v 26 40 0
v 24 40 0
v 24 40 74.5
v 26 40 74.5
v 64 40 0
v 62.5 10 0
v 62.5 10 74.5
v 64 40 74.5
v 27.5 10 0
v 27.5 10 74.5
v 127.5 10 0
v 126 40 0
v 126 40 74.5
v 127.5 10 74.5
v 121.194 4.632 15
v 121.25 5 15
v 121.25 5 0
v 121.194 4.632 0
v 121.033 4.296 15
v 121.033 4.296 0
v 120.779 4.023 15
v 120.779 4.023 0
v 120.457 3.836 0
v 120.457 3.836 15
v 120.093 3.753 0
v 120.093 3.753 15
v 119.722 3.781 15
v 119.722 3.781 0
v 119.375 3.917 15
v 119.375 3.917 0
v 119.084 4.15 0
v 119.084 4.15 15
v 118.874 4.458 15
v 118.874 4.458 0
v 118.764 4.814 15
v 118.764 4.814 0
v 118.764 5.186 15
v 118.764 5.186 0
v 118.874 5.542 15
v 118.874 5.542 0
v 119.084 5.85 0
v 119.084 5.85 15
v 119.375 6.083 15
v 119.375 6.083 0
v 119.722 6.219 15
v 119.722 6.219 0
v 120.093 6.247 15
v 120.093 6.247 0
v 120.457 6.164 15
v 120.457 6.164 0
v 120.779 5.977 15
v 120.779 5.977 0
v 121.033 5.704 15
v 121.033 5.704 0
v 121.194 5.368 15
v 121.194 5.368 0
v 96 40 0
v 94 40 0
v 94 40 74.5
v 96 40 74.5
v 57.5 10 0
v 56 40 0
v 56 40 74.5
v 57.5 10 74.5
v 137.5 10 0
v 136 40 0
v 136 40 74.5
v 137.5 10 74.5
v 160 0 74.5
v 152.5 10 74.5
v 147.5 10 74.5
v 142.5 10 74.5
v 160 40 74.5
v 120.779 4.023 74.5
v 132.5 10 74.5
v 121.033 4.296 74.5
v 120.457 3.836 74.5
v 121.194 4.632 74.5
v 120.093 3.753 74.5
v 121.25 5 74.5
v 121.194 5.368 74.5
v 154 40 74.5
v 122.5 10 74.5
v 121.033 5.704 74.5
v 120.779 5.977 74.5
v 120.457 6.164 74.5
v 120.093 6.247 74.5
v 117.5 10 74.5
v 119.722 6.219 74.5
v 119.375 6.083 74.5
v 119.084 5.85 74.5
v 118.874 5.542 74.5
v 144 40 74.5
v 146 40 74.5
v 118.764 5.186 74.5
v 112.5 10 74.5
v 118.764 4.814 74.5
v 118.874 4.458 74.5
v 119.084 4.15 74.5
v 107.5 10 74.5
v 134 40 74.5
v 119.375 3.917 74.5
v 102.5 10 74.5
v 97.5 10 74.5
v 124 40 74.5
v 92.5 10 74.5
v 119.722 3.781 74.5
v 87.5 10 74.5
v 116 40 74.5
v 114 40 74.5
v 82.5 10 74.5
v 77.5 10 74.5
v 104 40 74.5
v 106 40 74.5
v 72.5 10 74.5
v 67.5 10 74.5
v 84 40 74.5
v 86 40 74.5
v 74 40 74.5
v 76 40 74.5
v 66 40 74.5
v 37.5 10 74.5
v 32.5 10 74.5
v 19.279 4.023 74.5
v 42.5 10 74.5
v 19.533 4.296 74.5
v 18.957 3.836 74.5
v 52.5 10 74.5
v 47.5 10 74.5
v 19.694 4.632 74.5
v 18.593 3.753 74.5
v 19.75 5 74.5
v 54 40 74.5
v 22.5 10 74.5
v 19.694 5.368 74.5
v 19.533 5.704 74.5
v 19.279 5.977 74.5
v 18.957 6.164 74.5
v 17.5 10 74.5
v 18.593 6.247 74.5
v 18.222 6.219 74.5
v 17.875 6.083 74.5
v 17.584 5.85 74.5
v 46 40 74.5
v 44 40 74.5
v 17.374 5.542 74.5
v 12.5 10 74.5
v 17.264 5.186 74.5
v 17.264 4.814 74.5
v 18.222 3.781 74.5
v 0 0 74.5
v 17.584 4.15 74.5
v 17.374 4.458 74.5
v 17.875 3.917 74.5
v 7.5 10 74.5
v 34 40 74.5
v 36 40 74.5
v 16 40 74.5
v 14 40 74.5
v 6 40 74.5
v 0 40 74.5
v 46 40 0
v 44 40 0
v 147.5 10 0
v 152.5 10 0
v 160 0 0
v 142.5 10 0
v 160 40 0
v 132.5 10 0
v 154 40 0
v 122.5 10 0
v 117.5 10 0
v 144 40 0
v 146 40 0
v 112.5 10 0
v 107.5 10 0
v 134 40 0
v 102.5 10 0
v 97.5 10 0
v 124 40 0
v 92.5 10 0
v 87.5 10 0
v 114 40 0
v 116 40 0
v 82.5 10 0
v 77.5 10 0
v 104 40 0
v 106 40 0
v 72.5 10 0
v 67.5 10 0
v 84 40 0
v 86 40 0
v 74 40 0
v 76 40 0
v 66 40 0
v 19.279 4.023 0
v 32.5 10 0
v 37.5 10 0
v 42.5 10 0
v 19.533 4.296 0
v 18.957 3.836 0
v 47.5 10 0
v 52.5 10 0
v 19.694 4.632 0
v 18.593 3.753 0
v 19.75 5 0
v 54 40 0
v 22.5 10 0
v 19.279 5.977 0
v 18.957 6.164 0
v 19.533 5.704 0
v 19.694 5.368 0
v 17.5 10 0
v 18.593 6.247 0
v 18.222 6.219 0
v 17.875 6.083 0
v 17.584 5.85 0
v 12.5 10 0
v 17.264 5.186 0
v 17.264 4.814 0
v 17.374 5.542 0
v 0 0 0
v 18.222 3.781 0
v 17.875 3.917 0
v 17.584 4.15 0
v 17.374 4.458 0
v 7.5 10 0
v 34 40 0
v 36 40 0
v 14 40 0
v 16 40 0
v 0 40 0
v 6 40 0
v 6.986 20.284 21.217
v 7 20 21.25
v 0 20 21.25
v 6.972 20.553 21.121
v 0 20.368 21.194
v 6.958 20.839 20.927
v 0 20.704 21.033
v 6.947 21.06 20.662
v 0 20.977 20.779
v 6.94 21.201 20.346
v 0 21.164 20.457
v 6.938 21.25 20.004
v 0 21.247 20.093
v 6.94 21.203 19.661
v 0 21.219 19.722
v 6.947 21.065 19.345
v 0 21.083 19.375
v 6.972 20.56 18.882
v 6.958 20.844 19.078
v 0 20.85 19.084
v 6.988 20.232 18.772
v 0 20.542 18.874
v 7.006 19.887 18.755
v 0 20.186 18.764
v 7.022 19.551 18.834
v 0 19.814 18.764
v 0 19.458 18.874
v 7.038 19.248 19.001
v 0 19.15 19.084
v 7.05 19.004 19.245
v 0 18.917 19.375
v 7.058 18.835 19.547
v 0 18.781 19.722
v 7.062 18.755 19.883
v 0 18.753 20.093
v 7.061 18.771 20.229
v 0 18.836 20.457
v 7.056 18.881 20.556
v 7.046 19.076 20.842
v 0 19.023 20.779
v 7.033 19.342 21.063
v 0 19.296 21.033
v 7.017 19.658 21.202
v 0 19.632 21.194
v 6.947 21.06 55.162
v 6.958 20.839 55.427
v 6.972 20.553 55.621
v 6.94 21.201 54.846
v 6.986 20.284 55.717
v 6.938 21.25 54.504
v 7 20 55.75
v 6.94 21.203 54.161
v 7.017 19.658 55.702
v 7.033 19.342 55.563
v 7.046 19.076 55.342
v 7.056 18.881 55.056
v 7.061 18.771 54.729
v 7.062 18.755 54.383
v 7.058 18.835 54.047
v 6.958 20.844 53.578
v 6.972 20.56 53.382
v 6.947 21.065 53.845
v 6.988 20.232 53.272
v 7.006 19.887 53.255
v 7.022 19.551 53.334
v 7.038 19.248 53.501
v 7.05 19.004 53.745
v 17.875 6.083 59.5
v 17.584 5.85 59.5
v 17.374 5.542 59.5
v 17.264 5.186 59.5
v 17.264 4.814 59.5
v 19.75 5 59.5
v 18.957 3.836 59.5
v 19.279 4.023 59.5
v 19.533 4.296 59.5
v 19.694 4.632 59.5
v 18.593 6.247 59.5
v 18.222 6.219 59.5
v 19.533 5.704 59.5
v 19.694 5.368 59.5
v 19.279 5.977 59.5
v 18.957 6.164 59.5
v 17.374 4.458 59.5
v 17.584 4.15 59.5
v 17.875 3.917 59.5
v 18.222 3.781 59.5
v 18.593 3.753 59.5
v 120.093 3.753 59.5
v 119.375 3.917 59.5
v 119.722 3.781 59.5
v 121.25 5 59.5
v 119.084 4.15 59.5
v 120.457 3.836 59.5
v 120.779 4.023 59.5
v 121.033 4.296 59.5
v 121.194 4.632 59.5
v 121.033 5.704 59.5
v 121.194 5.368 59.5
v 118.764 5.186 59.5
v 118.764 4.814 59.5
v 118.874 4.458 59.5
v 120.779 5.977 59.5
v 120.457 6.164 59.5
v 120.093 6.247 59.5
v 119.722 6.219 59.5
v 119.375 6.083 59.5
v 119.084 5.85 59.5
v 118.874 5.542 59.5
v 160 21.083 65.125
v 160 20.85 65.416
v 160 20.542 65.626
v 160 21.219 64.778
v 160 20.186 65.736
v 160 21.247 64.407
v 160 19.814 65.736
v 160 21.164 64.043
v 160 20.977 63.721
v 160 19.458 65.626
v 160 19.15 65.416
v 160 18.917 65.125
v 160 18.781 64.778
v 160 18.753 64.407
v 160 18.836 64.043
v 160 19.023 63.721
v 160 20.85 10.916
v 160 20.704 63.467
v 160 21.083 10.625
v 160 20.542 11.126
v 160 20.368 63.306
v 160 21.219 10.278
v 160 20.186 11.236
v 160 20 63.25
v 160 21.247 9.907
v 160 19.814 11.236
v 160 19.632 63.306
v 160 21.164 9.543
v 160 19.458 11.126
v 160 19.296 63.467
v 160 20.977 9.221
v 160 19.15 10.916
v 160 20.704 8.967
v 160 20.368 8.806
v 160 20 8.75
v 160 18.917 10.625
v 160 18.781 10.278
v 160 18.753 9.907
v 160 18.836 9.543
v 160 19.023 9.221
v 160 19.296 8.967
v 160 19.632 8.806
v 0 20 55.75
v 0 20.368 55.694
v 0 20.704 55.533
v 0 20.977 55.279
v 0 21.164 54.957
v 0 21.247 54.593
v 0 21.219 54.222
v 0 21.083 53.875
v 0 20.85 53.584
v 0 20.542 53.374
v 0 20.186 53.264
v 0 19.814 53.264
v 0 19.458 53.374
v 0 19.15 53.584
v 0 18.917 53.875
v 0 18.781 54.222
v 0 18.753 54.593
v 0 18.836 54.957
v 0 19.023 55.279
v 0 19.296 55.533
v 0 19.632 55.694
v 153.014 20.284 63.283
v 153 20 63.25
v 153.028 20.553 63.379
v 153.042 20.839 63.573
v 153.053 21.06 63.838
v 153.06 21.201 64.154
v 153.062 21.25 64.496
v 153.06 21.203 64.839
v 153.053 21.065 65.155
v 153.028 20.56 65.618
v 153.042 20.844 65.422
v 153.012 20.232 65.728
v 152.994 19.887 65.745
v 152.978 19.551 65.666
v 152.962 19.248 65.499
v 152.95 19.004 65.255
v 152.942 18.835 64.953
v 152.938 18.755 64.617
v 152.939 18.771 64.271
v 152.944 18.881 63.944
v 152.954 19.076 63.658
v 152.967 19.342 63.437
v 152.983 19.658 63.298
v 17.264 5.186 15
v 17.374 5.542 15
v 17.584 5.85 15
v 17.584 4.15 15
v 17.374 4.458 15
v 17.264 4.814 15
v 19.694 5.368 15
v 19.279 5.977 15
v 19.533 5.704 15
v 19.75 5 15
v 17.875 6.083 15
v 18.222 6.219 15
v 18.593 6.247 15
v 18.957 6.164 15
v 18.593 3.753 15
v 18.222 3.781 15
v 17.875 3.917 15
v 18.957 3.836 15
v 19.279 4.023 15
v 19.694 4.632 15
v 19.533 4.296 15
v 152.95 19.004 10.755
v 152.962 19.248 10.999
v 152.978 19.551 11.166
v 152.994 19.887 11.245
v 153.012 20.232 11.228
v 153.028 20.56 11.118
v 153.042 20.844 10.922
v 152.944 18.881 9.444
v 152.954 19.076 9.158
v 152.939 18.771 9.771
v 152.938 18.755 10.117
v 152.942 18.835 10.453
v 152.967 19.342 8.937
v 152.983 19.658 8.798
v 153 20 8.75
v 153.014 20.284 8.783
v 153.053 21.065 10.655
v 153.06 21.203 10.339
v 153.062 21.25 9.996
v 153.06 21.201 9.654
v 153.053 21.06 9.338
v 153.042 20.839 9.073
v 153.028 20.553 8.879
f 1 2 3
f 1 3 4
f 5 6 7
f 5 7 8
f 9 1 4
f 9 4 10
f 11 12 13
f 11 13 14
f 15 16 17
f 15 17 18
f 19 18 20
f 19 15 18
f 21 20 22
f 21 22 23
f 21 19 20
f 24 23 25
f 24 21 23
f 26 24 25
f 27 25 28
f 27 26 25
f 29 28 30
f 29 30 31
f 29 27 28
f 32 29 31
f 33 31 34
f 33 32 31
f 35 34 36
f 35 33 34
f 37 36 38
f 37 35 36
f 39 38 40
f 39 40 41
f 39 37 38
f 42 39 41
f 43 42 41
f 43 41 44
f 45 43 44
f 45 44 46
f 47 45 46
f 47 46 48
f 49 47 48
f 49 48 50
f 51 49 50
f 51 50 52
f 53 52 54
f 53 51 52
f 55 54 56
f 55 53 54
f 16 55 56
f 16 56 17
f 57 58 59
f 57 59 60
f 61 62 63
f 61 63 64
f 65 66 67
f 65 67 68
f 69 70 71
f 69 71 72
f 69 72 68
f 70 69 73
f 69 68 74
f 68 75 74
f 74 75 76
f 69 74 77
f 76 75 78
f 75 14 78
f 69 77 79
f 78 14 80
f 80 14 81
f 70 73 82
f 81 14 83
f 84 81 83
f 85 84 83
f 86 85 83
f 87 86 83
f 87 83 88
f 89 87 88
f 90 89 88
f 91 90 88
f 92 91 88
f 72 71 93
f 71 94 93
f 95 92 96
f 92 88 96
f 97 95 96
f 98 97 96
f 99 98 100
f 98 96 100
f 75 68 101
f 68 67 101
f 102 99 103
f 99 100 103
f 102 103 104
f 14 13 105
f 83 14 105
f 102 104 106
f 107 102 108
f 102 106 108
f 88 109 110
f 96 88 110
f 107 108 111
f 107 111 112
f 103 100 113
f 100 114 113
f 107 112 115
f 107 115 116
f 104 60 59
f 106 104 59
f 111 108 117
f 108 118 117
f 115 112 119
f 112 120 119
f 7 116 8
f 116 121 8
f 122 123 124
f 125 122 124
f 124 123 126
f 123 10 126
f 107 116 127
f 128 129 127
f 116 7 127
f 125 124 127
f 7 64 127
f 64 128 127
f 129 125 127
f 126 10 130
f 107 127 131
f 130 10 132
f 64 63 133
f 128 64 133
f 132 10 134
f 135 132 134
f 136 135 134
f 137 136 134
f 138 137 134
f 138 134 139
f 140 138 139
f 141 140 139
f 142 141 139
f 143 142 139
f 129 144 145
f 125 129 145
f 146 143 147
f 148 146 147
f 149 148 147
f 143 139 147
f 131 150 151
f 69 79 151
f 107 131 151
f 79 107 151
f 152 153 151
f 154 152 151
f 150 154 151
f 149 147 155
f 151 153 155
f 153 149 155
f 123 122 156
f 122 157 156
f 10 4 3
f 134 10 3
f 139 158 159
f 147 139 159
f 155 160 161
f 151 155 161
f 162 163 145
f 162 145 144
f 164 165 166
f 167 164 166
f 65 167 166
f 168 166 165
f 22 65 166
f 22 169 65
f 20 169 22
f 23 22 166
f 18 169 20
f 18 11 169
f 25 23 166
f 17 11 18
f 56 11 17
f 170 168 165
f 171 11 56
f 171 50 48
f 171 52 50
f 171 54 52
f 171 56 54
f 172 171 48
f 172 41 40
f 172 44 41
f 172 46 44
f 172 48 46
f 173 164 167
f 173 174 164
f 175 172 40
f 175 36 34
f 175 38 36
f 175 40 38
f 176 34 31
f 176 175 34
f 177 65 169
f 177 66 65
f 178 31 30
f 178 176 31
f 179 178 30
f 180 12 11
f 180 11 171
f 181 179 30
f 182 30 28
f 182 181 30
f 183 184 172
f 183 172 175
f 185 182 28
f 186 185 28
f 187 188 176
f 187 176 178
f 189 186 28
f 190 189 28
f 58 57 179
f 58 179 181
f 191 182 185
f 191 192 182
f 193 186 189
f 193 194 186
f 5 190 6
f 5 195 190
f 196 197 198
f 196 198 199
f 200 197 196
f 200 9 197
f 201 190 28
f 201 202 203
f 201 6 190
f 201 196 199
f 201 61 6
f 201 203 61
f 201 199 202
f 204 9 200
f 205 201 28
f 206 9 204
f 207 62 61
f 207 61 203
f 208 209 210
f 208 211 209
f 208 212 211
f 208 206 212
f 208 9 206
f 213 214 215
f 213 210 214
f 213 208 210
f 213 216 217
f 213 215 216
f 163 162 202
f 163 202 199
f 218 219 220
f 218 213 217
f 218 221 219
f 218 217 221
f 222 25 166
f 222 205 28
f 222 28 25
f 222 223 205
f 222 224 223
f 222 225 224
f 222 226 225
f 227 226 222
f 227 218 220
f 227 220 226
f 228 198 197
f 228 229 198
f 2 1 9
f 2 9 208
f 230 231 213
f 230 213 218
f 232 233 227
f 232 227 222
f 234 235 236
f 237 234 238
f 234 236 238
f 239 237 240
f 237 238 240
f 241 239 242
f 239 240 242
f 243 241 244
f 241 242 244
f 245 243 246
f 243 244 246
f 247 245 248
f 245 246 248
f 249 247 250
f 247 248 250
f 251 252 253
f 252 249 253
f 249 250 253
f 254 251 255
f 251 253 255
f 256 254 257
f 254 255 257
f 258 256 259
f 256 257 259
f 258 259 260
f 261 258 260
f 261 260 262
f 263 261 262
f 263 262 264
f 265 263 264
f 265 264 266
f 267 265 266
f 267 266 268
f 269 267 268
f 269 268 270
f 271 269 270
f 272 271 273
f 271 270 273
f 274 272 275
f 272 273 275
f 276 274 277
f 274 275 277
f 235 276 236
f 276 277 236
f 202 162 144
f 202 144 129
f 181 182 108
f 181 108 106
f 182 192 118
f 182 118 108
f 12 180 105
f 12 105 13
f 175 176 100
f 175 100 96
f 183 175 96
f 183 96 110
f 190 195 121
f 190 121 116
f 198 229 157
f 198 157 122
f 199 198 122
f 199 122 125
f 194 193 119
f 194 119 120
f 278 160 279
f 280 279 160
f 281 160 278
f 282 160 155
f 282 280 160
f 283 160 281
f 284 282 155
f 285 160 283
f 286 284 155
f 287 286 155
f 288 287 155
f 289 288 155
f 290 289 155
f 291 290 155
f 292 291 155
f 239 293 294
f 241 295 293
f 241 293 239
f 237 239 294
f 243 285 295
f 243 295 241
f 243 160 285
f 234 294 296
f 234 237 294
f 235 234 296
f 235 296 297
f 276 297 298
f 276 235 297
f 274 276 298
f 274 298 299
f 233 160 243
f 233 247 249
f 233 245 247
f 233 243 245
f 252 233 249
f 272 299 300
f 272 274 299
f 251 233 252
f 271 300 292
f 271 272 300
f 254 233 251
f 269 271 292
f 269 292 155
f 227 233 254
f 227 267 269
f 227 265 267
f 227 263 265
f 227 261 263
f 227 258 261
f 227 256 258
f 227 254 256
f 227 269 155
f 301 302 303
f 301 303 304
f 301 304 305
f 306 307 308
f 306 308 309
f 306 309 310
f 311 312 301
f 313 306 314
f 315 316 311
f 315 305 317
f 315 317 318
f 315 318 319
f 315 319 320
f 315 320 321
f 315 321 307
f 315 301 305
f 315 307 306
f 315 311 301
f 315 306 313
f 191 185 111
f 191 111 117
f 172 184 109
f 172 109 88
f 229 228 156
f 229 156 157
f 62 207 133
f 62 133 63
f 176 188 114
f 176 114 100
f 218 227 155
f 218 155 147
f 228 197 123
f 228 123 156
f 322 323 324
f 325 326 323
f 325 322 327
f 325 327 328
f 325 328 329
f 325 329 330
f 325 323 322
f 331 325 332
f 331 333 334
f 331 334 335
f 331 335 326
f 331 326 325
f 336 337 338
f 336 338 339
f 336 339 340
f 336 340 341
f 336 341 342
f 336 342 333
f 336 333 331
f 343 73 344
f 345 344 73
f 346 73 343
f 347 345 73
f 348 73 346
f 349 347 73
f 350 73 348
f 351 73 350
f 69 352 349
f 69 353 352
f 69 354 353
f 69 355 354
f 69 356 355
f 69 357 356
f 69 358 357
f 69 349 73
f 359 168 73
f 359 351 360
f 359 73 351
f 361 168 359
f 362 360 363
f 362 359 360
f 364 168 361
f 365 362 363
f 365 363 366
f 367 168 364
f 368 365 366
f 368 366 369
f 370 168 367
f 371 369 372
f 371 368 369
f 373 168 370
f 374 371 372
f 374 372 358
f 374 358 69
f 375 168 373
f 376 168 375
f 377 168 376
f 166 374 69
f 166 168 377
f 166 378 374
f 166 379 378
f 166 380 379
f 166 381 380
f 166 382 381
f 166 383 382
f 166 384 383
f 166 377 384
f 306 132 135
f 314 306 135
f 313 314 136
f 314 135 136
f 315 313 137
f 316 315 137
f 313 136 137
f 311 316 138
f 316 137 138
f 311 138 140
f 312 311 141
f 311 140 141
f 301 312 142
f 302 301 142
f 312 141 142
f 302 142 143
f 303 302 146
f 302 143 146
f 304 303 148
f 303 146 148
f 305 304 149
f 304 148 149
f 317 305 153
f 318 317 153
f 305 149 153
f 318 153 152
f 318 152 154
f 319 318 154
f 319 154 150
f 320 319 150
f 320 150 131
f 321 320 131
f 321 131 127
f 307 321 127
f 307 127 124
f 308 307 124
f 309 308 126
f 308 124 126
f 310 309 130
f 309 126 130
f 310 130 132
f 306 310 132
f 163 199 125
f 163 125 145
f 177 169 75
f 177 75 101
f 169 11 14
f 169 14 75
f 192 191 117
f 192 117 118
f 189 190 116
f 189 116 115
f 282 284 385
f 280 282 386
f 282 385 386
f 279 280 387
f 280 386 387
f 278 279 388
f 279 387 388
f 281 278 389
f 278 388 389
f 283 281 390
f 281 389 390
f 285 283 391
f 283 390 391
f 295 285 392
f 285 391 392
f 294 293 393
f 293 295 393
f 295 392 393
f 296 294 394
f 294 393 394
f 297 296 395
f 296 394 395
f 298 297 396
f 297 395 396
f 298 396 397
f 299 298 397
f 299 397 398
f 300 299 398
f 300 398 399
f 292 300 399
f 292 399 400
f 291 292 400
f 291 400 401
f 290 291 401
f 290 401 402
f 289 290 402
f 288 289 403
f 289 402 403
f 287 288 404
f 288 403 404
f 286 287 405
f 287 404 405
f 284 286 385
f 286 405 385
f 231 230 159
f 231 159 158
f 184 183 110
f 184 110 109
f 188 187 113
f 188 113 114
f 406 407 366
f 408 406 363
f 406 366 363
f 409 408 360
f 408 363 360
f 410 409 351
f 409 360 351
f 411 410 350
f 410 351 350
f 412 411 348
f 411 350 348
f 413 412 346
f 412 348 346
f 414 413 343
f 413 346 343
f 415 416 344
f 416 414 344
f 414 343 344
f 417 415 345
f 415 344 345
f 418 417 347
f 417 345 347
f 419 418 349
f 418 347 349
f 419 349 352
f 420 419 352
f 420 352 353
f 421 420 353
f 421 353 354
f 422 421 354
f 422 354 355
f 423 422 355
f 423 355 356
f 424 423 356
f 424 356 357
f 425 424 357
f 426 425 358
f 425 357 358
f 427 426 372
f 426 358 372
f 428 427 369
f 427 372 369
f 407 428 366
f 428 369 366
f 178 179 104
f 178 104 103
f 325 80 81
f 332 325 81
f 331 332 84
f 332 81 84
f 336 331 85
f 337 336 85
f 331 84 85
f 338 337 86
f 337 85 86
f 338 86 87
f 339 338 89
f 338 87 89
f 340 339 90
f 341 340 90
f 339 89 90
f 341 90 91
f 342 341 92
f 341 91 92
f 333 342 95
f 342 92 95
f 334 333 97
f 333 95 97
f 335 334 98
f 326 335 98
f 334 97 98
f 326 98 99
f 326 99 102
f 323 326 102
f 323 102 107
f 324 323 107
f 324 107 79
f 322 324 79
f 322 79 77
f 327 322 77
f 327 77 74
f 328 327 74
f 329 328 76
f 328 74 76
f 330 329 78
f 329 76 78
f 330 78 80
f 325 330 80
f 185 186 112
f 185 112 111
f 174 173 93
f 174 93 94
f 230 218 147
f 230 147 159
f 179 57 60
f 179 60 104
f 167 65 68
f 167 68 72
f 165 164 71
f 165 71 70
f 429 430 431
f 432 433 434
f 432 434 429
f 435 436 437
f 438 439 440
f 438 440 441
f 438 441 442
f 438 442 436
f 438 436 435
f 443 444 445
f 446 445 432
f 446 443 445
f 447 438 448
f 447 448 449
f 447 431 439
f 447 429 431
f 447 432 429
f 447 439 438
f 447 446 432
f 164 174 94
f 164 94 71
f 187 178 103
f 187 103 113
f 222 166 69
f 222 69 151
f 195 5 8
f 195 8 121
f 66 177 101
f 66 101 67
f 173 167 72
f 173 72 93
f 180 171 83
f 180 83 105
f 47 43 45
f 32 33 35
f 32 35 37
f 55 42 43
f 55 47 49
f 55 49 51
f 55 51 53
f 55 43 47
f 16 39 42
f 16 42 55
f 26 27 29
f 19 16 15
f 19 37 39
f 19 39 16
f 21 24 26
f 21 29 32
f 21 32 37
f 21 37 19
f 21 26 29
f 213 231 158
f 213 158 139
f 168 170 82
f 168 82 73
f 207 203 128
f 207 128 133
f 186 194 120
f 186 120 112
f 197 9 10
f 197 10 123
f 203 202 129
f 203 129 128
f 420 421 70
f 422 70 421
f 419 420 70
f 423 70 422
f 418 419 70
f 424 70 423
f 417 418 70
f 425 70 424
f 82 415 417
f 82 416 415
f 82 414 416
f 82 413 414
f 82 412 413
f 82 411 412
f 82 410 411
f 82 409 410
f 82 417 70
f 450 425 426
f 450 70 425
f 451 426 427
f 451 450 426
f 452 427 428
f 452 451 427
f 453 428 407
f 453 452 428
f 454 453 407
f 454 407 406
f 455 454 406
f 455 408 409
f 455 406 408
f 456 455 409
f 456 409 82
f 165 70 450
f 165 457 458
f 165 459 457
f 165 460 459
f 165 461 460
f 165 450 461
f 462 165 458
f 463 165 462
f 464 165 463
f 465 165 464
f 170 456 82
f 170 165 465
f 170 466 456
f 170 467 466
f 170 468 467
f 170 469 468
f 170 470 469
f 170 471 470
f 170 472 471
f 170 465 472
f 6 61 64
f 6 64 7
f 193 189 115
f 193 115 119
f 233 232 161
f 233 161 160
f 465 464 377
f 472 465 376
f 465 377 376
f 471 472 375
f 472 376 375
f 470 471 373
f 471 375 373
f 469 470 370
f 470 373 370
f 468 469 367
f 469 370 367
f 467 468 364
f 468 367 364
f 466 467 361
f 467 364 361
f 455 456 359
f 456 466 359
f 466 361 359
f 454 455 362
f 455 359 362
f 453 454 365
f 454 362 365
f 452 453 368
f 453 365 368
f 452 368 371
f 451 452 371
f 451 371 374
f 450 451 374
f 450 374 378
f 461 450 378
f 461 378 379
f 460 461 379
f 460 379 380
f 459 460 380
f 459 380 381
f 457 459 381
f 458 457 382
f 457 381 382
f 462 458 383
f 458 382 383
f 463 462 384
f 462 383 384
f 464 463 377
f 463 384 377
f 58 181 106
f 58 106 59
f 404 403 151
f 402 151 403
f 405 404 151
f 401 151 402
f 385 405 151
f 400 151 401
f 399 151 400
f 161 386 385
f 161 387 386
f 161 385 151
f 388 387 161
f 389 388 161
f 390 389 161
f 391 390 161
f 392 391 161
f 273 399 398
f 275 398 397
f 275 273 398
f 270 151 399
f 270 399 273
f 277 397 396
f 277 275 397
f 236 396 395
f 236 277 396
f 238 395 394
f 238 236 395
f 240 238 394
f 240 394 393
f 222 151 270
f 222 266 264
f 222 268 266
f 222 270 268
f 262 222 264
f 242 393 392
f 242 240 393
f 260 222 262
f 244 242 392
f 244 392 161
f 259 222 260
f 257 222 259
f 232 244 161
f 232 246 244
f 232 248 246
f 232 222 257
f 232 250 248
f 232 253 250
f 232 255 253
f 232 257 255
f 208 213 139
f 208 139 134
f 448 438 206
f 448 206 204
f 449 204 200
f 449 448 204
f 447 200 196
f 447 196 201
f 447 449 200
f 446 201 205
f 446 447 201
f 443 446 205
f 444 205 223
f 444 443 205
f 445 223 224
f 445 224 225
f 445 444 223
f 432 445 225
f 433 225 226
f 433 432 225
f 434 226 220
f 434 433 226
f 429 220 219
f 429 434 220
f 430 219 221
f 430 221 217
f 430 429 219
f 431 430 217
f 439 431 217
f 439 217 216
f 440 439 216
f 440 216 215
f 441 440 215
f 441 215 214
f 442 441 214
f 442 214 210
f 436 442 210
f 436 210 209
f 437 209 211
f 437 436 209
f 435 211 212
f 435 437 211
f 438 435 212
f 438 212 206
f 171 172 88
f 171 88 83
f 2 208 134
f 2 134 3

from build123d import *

# Parameters (mm, degrees)
BOSS_EXTRUDE1_DEPTH = 74.5
SKETCH2_R           = 1.25
CUT_EXTRUDE1_DEPTH  = 10
SKETCH3_R           = 1.25
CUT_EXTRUDE2_DEPTH  = 10
SKETCH4_R           = 1.25
CUT_EXTRUDE3_DEPTH  = 15
CUT_EXTRUDE4_START  = -15
SKETCH5_R           = 1.25
CUT_EXTRUDE4_DEPTH  = 15


with BuildPart() as part:
    # Sketch1 → Boss-Extrude1 (new body)
    with BuildSketch(Plane.XY):
        Polygon((0, 0), (0, 40), (6, 40), (7.5, 10), (12.5, 10), (14, 40), (16, 40), (17.5, 10), (22.5, 10), (24, 40), (26, 40), (27.5, 10), (32.5, 10), (34, 40), (36, 40), (37.5, 10), (42.5, 10), (44, 40), (46, 40), (47.5, 10), (52.5, 10), (54, 40), (56, 40), (57.5, 10), (62.5, 10), (64, 40), (66, 40), (67.5, 10), (72.5, 10), (74, 40), (76, 40), (77.5, 10), (82.5, 10), (84, 40), (86, 40), (87.5, 10), (92.5, 10), (94, 40), (96, 40), (97.5, 10), (102.5, 10), (104, 40), (106, 40), (107.5, 10), (112.5, 10), (114, 40), (116, 40), (117.5, 10), (122.5, 10), (124, 40), (126, 40), (127.5, 10), (132.5, 10), (134, 40), (136, 40), (137.5, 10), (142.5, 10), (144, 40), (146, 40), (147.5, 10), (152.5, 10), (154, 40), (160, 40), (160, 0), align=None)
    extrude(amount=BOSS_EXTRUDE1_DEPTH)

    # Sketch2 → Cut-Extrude1 (cut)
    with BuildSketch(Plane(origin=(160, 0, 0), x_dir=(0, 0, -1), z_dir=(1, 0, 0))):
        with Locations((-64.5, 20)):
            Circle(SKETCH2_R)
        with Locations((-10, 20)):
            Circle(SKETCH2_R)
    extrude(amount=-CUT_EXTRUDE1_DEPTH, mode=Mode.SUBTRACT)

    # Sketch3 → Cut-Extrude2 (cut)
    with BuildSketch(Plane.ZY):
        with Locations((20, 20)):
            Circle(SKETCH3_R)
        with Locations((54.5, 20)):
            Circle(SKETCH3_R)
    extrude(amount=-CUT_EXTRUDE2_DEPTH, mode=Mode.SUBTRACT)

    # Sketch4 → Cut-Extrude3 (cut)
    with BuildSketch(Plane.XY.offset(74.5)):
        with Locations((18.5, 5)):
            Circle(SKETCH4_R)
        with Locations((120, 5)):
            Circle(SKETCH4_R)
    extrude(amount=-CUT_EXTRUDE3_DEPTH, mode=Mode.SUBTRACT)

    # Sketch5 → Cut-Extrude4 (cut)
    with BuildSketch(Plane(origin=(0, 0, 0), x_dir=(-1, 0, 0), z_dir=(0, 0, -1)).offset(CUT_EXTRUDE4_START)):
        with Locations(Location((-120, 5, 0), (0, 0, 180))):
            Circle(SKETCH5_R)
        with Locations(Location((-18.5, 5, 0), (0, 0, 180))):
            Circle(SKETCH5_R)
    extrude(amount=CUT_EXTRUDE4_DEPTH, mode=Mode.SUBTRACT)


solid = part.part
